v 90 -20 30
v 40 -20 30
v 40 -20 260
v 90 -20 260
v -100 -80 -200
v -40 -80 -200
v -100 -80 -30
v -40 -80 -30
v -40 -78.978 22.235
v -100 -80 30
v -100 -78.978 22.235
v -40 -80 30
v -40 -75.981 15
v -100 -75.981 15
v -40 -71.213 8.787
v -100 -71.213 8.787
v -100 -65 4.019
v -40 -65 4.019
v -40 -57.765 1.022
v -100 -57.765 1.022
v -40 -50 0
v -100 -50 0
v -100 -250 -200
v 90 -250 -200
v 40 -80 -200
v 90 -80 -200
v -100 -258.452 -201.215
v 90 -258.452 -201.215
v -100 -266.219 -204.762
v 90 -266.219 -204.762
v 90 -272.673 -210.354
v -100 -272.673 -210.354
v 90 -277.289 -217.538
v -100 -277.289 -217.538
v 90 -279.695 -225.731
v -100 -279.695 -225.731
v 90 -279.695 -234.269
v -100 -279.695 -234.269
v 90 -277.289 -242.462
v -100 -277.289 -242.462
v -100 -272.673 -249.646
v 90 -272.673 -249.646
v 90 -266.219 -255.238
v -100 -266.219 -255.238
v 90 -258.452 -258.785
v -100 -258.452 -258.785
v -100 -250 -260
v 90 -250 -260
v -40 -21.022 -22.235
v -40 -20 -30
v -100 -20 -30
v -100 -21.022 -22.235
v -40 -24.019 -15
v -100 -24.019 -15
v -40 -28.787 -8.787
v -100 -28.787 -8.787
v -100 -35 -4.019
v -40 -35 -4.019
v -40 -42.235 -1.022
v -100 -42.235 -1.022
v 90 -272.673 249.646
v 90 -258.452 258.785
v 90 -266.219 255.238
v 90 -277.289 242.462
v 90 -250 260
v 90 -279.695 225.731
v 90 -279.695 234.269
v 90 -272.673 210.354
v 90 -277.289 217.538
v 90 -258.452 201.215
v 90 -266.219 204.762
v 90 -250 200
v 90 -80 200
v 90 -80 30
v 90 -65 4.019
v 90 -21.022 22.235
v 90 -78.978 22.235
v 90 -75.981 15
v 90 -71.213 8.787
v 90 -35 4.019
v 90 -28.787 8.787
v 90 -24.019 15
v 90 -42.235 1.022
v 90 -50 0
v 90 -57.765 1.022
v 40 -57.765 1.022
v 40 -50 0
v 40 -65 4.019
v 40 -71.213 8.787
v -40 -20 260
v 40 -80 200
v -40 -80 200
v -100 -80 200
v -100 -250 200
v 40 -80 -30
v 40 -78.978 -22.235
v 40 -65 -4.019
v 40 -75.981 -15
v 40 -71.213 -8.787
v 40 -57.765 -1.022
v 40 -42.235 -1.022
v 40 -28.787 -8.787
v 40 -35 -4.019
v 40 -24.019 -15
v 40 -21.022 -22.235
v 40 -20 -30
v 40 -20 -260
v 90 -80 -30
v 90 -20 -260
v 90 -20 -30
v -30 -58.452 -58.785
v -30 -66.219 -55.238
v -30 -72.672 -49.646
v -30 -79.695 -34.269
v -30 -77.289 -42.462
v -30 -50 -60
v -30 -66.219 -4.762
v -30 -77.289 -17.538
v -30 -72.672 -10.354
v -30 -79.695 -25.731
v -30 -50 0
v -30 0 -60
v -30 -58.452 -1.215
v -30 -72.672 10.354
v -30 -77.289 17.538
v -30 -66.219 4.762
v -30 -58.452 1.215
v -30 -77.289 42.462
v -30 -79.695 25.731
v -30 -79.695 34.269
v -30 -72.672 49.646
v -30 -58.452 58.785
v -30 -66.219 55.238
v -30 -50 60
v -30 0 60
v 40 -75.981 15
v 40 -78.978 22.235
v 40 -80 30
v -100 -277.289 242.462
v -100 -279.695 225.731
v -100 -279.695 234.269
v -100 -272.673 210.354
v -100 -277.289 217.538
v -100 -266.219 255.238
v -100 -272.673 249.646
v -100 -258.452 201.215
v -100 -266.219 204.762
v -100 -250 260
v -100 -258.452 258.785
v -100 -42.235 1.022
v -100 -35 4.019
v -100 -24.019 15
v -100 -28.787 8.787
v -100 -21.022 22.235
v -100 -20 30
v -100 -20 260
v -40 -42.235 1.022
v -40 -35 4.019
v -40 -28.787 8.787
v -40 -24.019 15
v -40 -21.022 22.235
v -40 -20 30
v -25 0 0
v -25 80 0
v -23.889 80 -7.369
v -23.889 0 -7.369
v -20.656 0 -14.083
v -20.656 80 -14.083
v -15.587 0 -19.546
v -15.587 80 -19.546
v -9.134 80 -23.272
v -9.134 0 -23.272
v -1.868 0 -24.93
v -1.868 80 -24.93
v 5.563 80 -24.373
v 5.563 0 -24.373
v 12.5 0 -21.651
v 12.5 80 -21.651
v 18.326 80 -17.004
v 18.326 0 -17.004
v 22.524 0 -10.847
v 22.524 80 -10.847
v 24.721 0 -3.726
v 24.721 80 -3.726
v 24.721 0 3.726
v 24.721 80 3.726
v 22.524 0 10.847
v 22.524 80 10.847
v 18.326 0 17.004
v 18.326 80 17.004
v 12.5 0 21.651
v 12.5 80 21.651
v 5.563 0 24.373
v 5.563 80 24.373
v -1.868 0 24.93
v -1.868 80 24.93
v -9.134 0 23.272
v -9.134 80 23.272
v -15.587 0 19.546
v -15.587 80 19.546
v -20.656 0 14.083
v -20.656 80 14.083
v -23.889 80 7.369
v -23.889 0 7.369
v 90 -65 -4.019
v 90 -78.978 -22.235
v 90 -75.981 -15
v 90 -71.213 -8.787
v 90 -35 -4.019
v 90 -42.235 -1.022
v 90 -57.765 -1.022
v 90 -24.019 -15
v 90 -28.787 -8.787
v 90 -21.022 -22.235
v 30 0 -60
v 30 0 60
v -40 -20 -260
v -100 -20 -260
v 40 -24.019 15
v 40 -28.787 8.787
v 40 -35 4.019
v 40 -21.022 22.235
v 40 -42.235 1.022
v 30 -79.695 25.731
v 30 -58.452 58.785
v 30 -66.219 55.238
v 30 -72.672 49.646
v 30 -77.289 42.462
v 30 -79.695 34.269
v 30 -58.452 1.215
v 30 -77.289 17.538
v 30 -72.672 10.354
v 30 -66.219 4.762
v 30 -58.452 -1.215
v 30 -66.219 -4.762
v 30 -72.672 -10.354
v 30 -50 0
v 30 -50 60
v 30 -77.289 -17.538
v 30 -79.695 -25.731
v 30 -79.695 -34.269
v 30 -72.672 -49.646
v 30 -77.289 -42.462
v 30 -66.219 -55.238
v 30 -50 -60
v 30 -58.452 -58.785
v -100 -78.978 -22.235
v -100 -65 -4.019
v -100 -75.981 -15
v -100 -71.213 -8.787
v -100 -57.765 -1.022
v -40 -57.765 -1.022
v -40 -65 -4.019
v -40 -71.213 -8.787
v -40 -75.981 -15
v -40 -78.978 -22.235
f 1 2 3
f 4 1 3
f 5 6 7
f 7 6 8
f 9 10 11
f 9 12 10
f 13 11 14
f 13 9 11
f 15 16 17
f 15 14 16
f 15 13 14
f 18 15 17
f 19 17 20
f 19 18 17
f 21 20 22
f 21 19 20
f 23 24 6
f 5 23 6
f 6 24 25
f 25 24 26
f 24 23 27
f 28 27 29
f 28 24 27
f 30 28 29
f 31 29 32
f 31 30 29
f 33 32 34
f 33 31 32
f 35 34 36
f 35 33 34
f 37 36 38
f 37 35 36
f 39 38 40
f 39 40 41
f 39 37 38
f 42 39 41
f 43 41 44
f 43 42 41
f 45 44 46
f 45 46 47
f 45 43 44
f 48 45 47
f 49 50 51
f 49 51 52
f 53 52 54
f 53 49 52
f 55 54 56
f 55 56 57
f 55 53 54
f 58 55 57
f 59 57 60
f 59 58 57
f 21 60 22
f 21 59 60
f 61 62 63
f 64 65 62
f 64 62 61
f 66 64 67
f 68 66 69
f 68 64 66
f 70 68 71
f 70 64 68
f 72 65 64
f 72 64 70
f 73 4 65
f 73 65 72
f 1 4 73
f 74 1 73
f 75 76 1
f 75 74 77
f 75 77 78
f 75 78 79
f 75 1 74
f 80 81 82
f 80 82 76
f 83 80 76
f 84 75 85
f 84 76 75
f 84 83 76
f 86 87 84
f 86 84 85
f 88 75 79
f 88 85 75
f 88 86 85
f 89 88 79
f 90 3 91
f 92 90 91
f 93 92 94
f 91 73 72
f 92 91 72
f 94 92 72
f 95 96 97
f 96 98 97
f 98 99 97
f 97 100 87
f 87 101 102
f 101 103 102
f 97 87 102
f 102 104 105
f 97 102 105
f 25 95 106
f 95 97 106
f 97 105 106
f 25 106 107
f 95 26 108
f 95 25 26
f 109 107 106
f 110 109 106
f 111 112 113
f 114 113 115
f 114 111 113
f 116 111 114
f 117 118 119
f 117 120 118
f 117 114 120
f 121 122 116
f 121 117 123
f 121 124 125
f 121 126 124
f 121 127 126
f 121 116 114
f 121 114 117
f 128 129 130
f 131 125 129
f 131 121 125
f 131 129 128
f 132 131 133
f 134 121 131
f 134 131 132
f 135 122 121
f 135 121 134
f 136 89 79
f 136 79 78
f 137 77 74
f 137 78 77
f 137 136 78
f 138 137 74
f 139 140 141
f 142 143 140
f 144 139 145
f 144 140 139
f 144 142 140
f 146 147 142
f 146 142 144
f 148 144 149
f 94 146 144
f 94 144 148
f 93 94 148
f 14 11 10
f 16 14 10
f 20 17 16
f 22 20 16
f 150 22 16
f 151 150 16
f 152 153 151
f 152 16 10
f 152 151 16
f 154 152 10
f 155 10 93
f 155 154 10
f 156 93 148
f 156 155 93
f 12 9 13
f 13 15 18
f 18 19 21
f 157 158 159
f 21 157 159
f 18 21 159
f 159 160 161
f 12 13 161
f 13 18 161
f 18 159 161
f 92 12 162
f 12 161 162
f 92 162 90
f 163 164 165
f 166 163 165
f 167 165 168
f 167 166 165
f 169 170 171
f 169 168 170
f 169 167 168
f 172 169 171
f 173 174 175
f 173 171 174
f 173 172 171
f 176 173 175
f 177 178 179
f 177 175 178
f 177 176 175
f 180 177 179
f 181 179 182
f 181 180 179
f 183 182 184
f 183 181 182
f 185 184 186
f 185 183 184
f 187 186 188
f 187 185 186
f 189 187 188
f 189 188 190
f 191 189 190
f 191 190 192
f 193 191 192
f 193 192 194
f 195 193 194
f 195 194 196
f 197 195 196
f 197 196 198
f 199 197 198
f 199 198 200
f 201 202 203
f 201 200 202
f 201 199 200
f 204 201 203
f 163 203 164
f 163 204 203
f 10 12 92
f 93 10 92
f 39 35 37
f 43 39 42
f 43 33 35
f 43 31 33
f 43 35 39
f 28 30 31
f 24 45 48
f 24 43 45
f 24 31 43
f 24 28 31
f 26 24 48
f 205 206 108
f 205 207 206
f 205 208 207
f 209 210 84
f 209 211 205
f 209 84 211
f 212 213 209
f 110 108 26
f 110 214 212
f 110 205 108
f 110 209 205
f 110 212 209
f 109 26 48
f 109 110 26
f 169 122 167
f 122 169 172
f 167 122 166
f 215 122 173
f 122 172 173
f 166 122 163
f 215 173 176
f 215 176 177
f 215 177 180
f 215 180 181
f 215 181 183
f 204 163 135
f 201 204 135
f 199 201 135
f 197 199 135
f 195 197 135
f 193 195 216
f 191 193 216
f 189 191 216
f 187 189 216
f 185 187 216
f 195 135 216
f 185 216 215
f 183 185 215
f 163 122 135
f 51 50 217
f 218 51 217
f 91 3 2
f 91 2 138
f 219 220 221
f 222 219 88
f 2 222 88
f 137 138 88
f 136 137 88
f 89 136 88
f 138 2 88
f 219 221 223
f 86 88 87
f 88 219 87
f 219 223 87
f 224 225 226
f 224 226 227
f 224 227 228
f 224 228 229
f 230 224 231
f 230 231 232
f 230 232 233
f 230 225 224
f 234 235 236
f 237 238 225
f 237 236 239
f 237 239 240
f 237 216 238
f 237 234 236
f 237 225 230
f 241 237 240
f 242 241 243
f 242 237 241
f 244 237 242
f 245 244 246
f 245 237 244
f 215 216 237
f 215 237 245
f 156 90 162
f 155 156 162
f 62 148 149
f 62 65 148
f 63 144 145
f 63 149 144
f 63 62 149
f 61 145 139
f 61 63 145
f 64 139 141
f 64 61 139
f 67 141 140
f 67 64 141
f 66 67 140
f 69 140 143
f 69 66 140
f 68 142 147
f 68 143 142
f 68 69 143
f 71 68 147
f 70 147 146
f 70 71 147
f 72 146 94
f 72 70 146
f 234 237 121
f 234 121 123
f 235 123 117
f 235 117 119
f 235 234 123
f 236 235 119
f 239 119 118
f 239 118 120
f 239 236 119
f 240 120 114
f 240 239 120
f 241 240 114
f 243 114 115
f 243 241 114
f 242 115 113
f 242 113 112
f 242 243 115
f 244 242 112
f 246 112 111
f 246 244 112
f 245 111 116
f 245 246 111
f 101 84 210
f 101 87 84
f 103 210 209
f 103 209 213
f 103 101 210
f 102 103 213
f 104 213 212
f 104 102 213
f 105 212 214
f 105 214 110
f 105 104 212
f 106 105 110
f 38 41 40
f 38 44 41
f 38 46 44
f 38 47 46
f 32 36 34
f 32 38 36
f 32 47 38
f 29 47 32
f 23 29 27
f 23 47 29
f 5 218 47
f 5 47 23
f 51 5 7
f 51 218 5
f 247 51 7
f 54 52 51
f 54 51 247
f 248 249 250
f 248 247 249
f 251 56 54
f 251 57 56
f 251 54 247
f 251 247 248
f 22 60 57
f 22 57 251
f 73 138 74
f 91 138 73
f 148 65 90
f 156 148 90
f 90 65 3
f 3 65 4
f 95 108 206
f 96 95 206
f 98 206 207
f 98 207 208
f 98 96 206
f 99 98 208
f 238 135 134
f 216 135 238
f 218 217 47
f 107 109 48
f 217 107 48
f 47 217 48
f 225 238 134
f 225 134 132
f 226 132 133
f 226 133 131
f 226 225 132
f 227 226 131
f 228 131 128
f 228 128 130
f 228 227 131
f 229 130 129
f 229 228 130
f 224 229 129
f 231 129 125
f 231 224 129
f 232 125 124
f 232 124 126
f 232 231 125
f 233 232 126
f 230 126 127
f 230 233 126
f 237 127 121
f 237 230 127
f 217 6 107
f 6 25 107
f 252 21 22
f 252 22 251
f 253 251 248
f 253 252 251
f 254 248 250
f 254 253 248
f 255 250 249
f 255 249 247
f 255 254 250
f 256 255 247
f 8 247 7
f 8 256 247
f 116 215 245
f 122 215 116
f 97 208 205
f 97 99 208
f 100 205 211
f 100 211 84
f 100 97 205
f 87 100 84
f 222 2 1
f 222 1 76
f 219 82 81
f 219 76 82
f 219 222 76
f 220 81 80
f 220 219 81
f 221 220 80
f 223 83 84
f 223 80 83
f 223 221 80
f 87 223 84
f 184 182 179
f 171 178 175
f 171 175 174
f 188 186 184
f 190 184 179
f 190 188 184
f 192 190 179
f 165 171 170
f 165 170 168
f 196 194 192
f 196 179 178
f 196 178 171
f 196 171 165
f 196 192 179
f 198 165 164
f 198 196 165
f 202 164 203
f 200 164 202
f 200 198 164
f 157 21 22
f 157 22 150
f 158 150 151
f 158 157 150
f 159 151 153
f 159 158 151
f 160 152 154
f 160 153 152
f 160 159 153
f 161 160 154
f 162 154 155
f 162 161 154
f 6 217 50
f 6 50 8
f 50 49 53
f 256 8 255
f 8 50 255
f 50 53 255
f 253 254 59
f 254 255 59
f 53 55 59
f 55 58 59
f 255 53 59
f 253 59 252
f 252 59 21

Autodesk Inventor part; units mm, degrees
ref_plane "YZ Plane" through (0, 0, 0) normal (1, 0, 0) x (0, 1, 0)
ref_plane "XZ Plane" through (0, 0, 0) normal (0, 1, 0) x (-1, 0, 0)
sketch "草圖1" plane through (0, 0, 0) normal (0, 1, 0) x (-1, 0, 0)
  circle A0 centre (0, 0) radius 25
  dimension "d0" = 50
extrude "擠出1" add sketch "草圖1" along normal blind 80
sketch "草圖2" plane through (0, 0, 0) normal (0, -1, 0) x (1, 0, 0)
  line L0 (30, -60) -> (-30, -60)
  line L1 (-30, -60) -> (-30, 60)
  line L2 (-30, 60) -> (30, 60)
  line L3 (30, 60) -> (30, -60)
  line L4 (30, -60) -> (-30, 60) construction
  line L5 (-30, -60) -> (30, 60) construction
  point P0 (0, 0)
  dimension "d3" = 120
  dimension "d4" = 60
extrude "擠出2" add sketch "草圖2" along normal blind 50
sketch "草圖3" plane through (30, 0, 60) normal (1, 0, 0) x (0, 0, -1)
  line L0 (120, -50) -> (0, -50) projected
  circle A0 centre (30, -50) radius 30
  circle A1 centre (90, -50) radius 30
  point P0 (60, 0)
  dimension "d8" = 60
  dimension "d7" = 60
extrude "擠出3" add sketch "草圖3" against normal up to surface (60 mm away)
ref_plane "工作平面1" through (40, 0, 60) normal (1, 0, 0) x (0, 0, -1)
sketch "草圖4" plane through (40, 0, 60) normal (1, 0, 0) x (0, 0, -1)
  arc A0 (0, -50) -> (60, -50) centre (30, -50) ccw projected
  line L0 (30, -50) -> (-111.4214, -191.4214)
  line L1 (-111.4214, -191.4214) -> (30, -332.8427)
  line L2 (0, 0) -> (0, -50) projected
  line L3 (51.2132, -71.2132) -> (-68.9949, -191.4214)
  line L4 (-68.9949, -191.4214) -> (51.2132, -311.6295)
  line L5 (8.7868, -28.7868) -> (-153.8478, -191.4214)
  line L6 (-153.8478, -191.4214) -> (8.7868, -354.0559)
  arc A1 (51.2132, -71.2132) -> (8.7868, -28.7868) centre (30, -50) ccw
  arc A2 (8.7868, -354.0559) -> (51.2132, -311.6295) centre (30, -332.8427) ccw
  point P0 (60, 0)
  dimension "d12" = 90
  dimension "d13" = 45
  dimension "d14" = 200
  dimension "d15" = 30
  dimension "d16" = 30
  dimension "d17" = 60
  dimension "d18" = 60
extrude "擠出4" add sketch "草圖4" along normal blind 50 separate body
sketch "草圖8" plane through (40, 0, 60) normal (-1, 0, 0) x (0, 0, 1)
  line L0 (-8.7868, -354.0559) -> (153.8478, -191.4214) projected
  line L1 (68.9949, -191.4214) -> (-51.2132, -311.6295) projected
  arc A0 (-51.2132, -311.6295) -> (-8.7868, -354.0559) centre (-30, -332.8427) ccw projected
  line L2 (153.8478, -191.4214) -> (-8.7868, -354.0559) projected
  line L3 (153.8478, -191.4214) -> (68.9949, -191.4214)
  point P0 (-60, 0)
extrude "擠出7" add sketch "草圖8" along normal blind 80 bodies 2
sketch "草圖9" plane through (-40, 0, 60) normal (-1, 0, 0) x (0, 0, 1)
  line L0 (68.9949, -191.4214) -> (153.8478, -191.4214) projected
  line L1 (153.8478, -191.4214) -> (-8.7868, -28.7868) projected
  arc A0 (-8.7868, -28.7868) -> (-51.2132, -71.2132) centre (-30, -50) ccw projected
  line L2 (-51.2132, -71.2132) -> (68.9949, -191.4214) projected
  line L3 (-8.7868, -354.0559) -> (153.8478, -191.4214) projected
  line L4 (153.8478, -191.4214) -> (68.9949, -191.4214) projected
  line L5 (68.9949, -191.4214) -> (-51.2132, -311.6295) projected
  arc A1 (-51.2132, -311.6295) -> (-8.7868, -354.0559) centre (-30, -332.8427) ccw projected
  point P0 (-60, 0)
extrude "擠出8" add sketch "草圖9" along normal blind 60 bodies 2
move or copy body "旋轉1" bodies to move or copy 2 copy no rotation origin (0, 0, 0) rotation axis (1, 0, 0) rotation angle -45 translate (0, -35.8579, -26.5685)
mirror "鏡射1" about plane through (0, 0, 0) normal (0, 0, 1) bodies 2
properties part number "夾爪"
